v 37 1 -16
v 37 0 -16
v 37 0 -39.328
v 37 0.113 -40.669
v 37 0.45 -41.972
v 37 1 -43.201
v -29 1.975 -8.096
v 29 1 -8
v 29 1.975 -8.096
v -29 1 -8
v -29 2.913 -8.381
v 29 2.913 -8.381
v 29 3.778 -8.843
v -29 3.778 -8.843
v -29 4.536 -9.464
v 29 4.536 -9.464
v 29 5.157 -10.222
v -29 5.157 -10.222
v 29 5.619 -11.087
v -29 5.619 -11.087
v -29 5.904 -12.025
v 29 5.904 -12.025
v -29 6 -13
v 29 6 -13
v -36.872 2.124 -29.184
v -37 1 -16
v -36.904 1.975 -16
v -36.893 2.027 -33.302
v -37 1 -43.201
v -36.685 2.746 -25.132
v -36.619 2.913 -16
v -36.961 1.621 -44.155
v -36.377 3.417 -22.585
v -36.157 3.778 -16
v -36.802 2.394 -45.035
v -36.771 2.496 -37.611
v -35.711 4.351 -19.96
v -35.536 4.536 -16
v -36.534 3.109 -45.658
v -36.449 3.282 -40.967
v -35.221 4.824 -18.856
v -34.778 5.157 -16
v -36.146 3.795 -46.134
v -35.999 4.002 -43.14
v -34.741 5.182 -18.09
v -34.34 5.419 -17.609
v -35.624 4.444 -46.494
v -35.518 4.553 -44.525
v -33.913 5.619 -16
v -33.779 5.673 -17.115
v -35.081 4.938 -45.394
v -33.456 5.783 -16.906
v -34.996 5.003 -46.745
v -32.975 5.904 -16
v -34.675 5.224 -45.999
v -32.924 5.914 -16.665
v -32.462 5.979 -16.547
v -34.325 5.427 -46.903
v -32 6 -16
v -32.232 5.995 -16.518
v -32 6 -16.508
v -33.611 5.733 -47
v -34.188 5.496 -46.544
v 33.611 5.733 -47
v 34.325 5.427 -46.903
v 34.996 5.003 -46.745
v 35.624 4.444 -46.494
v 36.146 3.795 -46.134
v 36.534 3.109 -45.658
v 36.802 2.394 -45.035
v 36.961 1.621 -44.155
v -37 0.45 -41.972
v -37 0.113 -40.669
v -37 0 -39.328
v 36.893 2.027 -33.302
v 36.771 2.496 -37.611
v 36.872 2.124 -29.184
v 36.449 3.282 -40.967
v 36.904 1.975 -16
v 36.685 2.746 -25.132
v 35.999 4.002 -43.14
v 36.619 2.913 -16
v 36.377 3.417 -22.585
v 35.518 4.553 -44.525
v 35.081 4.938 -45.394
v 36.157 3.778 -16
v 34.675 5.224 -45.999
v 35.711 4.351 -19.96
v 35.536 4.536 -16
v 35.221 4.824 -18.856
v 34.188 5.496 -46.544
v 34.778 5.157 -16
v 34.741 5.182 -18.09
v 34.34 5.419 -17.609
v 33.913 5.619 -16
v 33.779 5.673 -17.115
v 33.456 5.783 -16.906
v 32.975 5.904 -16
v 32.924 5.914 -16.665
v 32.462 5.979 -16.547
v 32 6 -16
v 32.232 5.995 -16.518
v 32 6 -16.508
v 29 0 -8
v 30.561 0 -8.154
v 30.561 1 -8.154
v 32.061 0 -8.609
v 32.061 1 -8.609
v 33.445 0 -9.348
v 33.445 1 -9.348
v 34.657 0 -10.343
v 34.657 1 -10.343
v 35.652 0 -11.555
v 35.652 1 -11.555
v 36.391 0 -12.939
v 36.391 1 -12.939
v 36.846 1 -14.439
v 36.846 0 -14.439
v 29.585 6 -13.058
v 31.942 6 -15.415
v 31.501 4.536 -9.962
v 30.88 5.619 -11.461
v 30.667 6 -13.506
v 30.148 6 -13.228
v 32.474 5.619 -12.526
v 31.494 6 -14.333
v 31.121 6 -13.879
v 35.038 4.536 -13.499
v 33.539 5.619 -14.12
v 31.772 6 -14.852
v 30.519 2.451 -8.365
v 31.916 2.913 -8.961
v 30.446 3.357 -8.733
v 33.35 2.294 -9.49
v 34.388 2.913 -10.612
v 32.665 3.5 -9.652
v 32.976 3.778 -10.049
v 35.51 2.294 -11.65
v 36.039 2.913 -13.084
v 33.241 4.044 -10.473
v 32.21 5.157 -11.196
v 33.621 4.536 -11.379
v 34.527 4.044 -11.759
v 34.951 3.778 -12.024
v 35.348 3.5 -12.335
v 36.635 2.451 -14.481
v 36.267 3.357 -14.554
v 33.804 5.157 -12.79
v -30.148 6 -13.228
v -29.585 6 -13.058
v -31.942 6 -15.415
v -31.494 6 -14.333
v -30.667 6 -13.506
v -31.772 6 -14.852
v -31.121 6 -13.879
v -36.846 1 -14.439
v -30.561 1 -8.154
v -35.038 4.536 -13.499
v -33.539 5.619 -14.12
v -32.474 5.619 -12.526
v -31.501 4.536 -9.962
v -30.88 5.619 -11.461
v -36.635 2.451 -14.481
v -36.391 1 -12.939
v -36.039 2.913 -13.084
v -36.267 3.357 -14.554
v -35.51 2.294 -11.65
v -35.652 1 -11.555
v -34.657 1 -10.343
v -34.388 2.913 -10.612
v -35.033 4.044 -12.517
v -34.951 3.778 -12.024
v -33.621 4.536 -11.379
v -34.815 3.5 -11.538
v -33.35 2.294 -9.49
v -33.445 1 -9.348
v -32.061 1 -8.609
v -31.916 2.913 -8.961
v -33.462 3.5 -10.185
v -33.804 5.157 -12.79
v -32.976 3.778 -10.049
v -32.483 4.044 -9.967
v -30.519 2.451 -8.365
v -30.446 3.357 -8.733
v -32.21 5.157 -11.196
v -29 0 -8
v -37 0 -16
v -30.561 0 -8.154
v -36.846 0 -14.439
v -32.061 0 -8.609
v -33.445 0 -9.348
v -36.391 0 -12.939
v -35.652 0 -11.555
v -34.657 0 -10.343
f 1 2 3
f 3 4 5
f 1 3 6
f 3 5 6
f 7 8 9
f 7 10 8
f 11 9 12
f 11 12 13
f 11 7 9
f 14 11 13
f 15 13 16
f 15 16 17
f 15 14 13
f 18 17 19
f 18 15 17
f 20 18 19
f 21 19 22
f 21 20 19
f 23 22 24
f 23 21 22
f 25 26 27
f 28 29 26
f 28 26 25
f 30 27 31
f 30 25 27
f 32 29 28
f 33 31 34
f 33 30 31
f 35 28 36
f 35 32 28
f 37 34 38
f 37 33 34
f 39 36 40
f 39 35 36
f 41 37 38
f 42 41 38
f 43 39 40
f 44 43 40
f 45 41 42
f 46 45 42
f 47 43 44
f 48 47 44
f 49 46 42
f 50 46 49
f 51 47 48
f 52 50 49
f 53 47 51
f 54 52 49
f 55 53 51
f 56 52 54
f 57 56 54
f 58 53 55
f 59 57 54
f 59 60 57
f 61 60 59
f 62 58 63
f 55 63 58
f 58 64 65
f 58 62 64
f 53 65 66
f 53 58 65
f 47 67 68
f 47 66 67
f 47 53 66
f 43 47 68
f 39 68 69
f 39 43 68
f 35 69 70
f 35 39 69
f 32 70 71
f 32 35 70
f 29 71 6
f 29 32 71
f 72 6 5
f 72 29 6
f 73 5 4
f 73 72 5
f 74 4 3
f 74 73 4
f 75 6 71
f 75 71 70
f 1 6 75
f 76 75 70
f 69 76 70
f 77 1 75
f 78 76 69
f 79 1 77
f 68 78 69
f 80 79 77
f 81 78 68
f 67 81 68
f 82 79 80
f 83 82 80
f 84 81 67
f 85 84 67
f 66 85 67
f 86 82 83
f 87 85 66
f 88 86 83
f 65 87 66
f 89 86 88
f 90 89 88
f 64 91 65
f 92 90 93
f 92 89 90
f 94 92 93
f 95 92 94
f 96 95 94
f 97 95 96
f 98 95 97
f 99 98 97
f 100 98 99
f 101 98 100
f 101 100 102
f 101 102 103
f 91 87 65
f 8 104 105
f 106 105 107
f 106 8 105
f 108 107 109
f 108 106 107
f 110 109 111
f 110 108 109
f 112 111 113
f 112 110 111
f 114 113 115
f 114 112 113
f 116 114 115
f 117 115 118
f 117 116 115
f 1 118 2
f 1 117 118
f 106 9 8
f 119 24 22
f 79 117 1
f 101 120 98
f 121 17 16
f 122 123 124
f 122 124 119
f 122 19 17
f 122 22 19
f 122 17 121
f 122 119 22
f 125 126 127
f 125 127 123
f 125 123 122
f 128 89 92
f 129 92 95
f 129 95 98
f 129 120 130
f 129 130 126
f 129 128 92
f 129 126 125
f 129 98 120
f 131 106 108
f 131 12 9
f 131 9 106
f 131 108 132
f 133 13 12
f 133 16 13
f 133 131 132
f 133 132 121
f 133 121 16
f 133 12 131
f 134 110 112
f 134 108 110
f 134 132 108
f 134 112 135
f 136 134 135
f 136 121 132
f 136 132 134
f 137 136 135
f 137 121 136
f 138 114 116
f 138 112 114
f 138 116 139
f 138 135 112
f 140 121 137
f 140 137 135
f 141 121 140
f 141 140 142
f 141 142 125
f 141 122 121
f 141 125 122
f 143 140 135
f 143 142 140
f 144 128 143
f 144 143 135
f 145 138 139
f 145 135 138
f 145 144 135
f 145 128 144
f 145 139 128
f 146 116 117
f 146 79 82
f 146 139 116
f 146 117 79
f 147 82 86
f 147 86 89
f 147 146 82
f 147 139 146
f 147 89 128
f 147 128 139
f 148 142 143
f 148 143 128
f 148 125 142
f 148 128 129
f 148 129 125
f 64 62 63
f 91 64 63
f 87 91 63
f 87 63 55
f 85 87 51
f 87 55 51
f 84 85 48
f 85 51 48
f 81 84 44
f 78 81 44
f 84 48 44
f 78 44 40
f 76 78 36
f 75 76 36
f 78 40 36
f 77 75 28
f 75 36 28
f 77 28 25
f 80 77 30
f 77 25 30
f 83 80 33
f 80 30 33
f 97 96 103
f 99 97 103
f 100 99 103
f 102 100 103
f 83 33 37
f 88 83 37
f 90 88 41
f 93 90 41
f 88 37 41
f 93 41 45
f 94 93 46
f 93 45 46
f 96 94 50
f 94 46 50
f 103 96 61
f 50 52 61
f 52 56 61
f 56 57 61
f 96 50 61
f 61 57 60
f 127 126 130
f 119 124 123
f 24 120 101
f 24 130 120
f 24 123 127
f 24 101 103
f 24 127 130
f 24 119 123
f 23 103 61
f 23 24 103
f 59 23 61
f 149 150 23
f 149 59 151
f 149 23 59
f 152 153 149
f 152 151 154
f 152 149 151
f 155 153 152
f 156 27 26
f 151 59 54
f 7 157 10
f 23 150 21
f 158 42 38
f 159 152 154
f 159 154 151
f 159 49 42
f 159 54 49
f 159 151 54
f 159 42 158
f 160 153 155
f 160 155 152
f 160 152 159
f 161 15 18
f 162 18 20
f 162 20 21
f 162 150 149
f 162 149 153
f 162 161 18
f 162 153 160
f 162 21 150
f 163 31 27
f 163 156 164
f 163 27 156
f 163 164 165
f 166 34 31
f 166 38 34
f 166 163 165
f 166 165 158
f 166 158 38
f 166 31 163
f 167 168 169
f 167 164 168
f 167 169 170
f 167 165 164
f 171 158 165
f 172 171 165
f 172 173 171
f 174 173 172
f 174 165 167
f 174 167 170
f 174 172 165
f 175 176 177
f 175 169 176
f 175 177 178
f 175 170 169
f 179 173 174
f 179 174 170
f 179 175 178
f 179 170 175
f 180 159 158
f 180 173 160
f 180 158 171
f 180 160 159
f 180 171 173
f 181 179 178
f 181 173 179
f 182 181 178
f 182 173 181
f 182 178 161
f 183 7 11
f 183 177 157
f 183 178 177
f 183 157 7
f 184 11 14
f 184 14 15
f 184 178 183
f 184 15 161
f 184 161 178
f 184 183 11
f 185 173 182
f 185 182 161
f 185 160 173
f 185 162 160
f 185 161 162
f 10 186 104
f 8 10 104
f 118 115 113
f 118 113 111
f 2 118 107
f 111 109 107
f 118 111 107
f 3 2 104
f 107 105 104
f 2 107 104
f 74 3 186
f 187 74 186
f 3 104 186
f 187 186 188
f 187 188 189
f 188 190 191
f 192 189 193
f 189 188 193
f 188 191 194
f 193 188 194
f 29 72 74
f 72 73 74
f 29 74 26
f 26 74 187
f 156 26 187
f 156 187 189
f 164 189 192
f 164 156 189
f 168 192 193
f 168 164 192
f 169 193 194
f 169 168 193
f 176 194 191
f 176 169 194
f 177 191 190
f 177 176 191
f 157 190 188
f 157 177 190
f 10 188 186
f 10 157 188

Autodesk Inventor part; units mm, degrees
ref_plane "YZ Plane" through (0, 0, 0) normal (1, 0, 0) x (0, 1, 0)
ref_plane "XZ Plane" through (0, 0, 0) normal (0, 1, 0) x (-1, 0, 0)
ref_plane "XY Plane" through (0, 0, 0) normal (0, 0, 1) x (1, 0, 0)
sketch "Sketch1" plane through (0, 0, 0) normal (0, 1, 0) x (-1, 0, 0)
  line L0 (25.9, 0) -> (-25.9, 0) projected
  line L1 (0, -25.9) -> (0, 25.9) projected
  circle A0 centre (0, 0) radius 18.5 construction
  circle A1 centre (0, 0) radius 13 construction
  dimension "d0" = 37
  dimension "d1" = 26
sketch "Sketch2" plane through (0, 0, 0) normal (0, 1, 0) x (-1, 0, 0)
  line L0 (0, -28.9) -> (0, 26.4) projected
  line L1 (-37, -8) -> (-37, -21)
  line L2 (-37, -21) -> (37, -21)
  line L3 (37, -21) -> (37, -8)
  line L4 (37, -8) -> (-37, -8)
  line L5 (-51.8, 0) -> (51.8, 0) projected
  point P0 (0, 0)
  dimension "d3" = 74
  dimension "d99" = 8
  dimension "d101" = 21
extrude "Extrusion1" add sketch "Sketch2" along normal blind 6
sketch "Sketch6" plane through (0, 0, 0) normal (0, 1, 0) x (-1, 0, 0)
  line L0 (37, -21) -> (-37, -21) projected
  line L1 (37, -8) -> (37, -21) projected
  line L2 (-37, -21) -> (37, -21)
  line L3 (37, -21) -> (37, -8)
  line L4 (-37, -8) -> (-37, -21)
  line L5 (58.8, 0) -> (-58.8, 0) projected
  line L6 (0, -28.9) -> (0, 26.4) projected
  arc A0 (-16, 0) -> (16, 0) centre (0, 0) ccw
  line L7 (16, 0) -> (16, 0)
  line L8 (37, 0) -> (-37, 0) projected
  line L9 (16, 0) -> (37, 0)
  line L10 (-16, 0) -> (-16, 0)
  line L11 (-16, 0) -> (-37, 0)
  point P0 (-17.3617, -21)
  dimension "d18" = 32
extrude "Extrusion5" [suppressed]
sketch "Sketch4" plane through (0, 0, 0) normal (0, 0, 1) x (1, 0, 0)
  line L0 (-18.5, 0) -> (18.5, 0)
  line L1 (18.5, 0) -> (18.5, -2)
  line L2 (18.5, -2) -> (-18.5, -2)
  line L3 (-18.5, -2) -> (-18.5, 0)
  line L4 (-25.9, 0) -> (25.9, 0) projected
  line L5 (0, -2.4) -> (0, 0.4) projected
  point P0 (0, 0)
  dimension "d10" = 37
  dimension "d11" = 2
extrude "Extrusion6" [suppressed]
sketch "Sketch5" plane through (0, 0, 0) normal (0, 1, 0) x (-1, 0, 0)
  circle A0 centre (0, 0) radius 18.5 construction
  circle A1 centre (0, 0) radius 18.5 construction
  line L0 (25.9, 0) -> (-25.9, 0) projected
  line L1 (0, -28.9) -> (0, 26.4) projected
  line L2 (-18.5, -21) -> (18.5, -21)
  line L3 (18.5, -21) -> (18.5, -18.5)
  line L4 (18.5, -18.5) -> (-18.5, -18.5)
  line L5 (-18.5, -18.5) -> (-18.5, -21)
  dimension "d25" = 37
  dimension "d26" = 21
extrude "Extrusion7" [suppressed]
sketch "Sketch7" plane through (0, 0, 0) normal (0, 0, 1) x (1, 0, 0)
  line L0 (-18.5, 0) -> (18.5, 0)
  line L1 (18.5, 0) -> (18.5, -2)
  line L2 (18.5, -2) -> (-18.5, -2)
  line L3 (-18.5, -2) -> (-18.5, 0)
  line L4 (37, 0) -> (-37, 0) projected
  line L5 (-58.8, 0) -> (58.8, 0) projected
  line L6 (0, -2.4) -> (0, 0.4) projected
  point P0 (-16, 0)
  point P1 (16, 0)
  dimension "d53" = 2
  dimension "d54" = 18.5
extrude "Extrusion8" [suppressed]
sketch "Sketch8" plane through (0, 0, 0) normal (0, 1, 0) x (-1, 0, 0)
  circle A0 centre (0, 0) radius 12.75
  dimension "d34" = 25.5
extrude "Extrusion9" [suppressed]
pattern_linear "Rectangular Pattern1" [suppressed]
sketch "Sketch9" plane through (0, 6, 0) normal (0, 1, 0) x (1, 0, 0)
  circle A0 centre (0, 0) radius 13
  circle A1 centre (0, 0) radius 15
  dimension "d40" = 26
  dimension "d41" = 30
extrude "Extrusion10" [suppressed]
sketch "Sketch10" plane through (0, 5, 0) normal (0, 1, 0) x (1, 0, 0)
  arc A0 (16, 0) -> (-16, 0) centre (0, 0) ccw projected
  line L0 (1.5, -18) -> (-1.5, -18)
  line L1 (-29.4, 0) -> (29.4, 0) projected
  line L2 (0, 36.3) -> (0, -70.8) projected
  line L3 (1.5, -12) -> (-1.5, -12)
  line L4 (1.5, -12) -> (1.5, -18)
  line L5 (-1.5, -18) -> (-1.5, -12)
  dimension "d48" = 3
  dimension "d49" = 12
  dimension "d50" = 6
extrude "Extrusion11" [suppressed]
fillet "Fillet1" [suppressed]
sketch "Sketch11" plane through (0, 0, 0) normal (0, 1, 0) x (-1, 0, 0)
  line L0 (-37, -21) -> (37, -21)
  line L1 (37, -21) -> (37, -47)
  line L2 (37, -47) -> (-37, -47)
  line L3 (-37, -47) -> (-37, -21)
  line L4 (58.8, 0) -> (-58.8, 0) projected
  line L5 (0, -60.1) -> (0, 31.6) projected
  point P0 (0, 0)
  dimension "d57" = 26
  dimension "d58" = 21
  dimension "d59" = 74
extrude "Extrusion12" add sketch "Sketch11" along normal blind 6
sketch "Sketch12" plane through (0, 0, 0) normal (1, 0, 0) x (0, 1, 0)
  line L0 (6, -8) -> (6, -47) projected
  arc A0 (6, -16.5081) -> (5.7334, -47) centre (34, -32) ccw
  line L1 (-6.8, 0) -> (40.8, 0) projected
  line L2 (0, -66) -> (0, 67) projected
  line L3 (6, -16.5081) -> (6, -47)
  line L4 (6, -47) -> (5.7334, -47)
  line L5 (0, -47) -> (6, -47) projected
  point P0 (0, 0)
  point P1 (6, 48)
  dimension "d62" = 32
  dimension "d63" = 32
  dimension "d64" = 34
extrude "Extrusion13" cut sketch "Sketch12" along normal through all both and the other way through all
fillet "Fillet3" radius 8 1 edges at (0, 0, -47)
sketch "Sketch13" plane through (0, 0, 0) normal (0, 1, 0) x (-1, 0, 0)
  line L0 (61.5, 0) -> (-75, 0) projected
  line L1 (0, -57.9802) -> (0, 72.5866) projected
  line L2 (37, -8) -> (37, -39.3278) projected
  arc A0 (13.0815, 23.9185) -> (13.0815, 13.0815) centre (18.5, 18.5) ccw
  line L3 (-37, -8) -> (-37, -16.5081) projected
  arc A1 (-13.0815, 13.0815) -> (-13.0815, 23.9185) centre (-18.5, 18.5) ccw
  line L4 (18.5, 37) -> (18.5, 0)
  line L5 (-18.5, 0) -> (-18.5, 37)
  line L6 (18.5, 37) -> (18.5, -8)
  line L7 (-37, 0) -> (37, 0) projected
  line L8 (-18.5, -8) -> (-18.5, 37)
  arc A2 (-9.2871, 53) -> (-13.0815, 23.9185) centre (0, 37) ccw
  arc A3 (13.0815, 23.9185) -> (9.2871, 53) centre (0, 37) ccw
  arc A4 (-13.0815, 13.0815) -> (-18.5, 0) centre (0, 0) ccw
  arc A5 (18.5, 0) -> (13.0815, 13.0815) centre (0, 0) ccw
  point P0 (37, -39.3278)
  point P1 (-55.5, 48)
  point P2 (-37, -16.5081)
  dimension "d68" = 37
  dimension "d71" = 18.5
  dimension "d72" = 18.5
  dimension "d73" = 7.663
  dimension "d74" = 7.663
  dimension "d75" = 18.5
  dimension "d76" = 18.5
  dimension "d77" = 18.5
  dimension "d78" = 18.5
extrude "Extrusion14" [suppressed]
sketch "Sketch14" plane through (0, 0, 0) normal (0, 1, 0) x (-1, 0, 0)
  circle A0 centre (18.5, 18.5) radius 10
  line L0 (39.9, 0) -> (-39.9, 0) projected
  line L1 (0, -27.9) -> (0, 37.9) projected
  circle A1 centre (-18.5, 18.5) radius 10
  point P0 (0, 0)
  dimension "d84" = 18.5
  dimension "d85" = 18.5
  dimension "d86" = 20
  dimension "d89" = 37
extrude "Extrusion15" [suppressed]
fillet "Fillet4" [suppressed]
fillet "Fillet5" radius 8 2 edges at (-37, 3, -8) (37, 3, -8)
fillet "Fillet6" radius 5 5 edges at (34.6569, 6, -10.3431) (37, 6, -16.254) (-34.6569, 6, -10.3431) (-37, 6, -16.254) (0, 6, -8)
equation "\"d85\" = d84"
properties part number "NespressoSpeedfiller-6X-long-scraper"
